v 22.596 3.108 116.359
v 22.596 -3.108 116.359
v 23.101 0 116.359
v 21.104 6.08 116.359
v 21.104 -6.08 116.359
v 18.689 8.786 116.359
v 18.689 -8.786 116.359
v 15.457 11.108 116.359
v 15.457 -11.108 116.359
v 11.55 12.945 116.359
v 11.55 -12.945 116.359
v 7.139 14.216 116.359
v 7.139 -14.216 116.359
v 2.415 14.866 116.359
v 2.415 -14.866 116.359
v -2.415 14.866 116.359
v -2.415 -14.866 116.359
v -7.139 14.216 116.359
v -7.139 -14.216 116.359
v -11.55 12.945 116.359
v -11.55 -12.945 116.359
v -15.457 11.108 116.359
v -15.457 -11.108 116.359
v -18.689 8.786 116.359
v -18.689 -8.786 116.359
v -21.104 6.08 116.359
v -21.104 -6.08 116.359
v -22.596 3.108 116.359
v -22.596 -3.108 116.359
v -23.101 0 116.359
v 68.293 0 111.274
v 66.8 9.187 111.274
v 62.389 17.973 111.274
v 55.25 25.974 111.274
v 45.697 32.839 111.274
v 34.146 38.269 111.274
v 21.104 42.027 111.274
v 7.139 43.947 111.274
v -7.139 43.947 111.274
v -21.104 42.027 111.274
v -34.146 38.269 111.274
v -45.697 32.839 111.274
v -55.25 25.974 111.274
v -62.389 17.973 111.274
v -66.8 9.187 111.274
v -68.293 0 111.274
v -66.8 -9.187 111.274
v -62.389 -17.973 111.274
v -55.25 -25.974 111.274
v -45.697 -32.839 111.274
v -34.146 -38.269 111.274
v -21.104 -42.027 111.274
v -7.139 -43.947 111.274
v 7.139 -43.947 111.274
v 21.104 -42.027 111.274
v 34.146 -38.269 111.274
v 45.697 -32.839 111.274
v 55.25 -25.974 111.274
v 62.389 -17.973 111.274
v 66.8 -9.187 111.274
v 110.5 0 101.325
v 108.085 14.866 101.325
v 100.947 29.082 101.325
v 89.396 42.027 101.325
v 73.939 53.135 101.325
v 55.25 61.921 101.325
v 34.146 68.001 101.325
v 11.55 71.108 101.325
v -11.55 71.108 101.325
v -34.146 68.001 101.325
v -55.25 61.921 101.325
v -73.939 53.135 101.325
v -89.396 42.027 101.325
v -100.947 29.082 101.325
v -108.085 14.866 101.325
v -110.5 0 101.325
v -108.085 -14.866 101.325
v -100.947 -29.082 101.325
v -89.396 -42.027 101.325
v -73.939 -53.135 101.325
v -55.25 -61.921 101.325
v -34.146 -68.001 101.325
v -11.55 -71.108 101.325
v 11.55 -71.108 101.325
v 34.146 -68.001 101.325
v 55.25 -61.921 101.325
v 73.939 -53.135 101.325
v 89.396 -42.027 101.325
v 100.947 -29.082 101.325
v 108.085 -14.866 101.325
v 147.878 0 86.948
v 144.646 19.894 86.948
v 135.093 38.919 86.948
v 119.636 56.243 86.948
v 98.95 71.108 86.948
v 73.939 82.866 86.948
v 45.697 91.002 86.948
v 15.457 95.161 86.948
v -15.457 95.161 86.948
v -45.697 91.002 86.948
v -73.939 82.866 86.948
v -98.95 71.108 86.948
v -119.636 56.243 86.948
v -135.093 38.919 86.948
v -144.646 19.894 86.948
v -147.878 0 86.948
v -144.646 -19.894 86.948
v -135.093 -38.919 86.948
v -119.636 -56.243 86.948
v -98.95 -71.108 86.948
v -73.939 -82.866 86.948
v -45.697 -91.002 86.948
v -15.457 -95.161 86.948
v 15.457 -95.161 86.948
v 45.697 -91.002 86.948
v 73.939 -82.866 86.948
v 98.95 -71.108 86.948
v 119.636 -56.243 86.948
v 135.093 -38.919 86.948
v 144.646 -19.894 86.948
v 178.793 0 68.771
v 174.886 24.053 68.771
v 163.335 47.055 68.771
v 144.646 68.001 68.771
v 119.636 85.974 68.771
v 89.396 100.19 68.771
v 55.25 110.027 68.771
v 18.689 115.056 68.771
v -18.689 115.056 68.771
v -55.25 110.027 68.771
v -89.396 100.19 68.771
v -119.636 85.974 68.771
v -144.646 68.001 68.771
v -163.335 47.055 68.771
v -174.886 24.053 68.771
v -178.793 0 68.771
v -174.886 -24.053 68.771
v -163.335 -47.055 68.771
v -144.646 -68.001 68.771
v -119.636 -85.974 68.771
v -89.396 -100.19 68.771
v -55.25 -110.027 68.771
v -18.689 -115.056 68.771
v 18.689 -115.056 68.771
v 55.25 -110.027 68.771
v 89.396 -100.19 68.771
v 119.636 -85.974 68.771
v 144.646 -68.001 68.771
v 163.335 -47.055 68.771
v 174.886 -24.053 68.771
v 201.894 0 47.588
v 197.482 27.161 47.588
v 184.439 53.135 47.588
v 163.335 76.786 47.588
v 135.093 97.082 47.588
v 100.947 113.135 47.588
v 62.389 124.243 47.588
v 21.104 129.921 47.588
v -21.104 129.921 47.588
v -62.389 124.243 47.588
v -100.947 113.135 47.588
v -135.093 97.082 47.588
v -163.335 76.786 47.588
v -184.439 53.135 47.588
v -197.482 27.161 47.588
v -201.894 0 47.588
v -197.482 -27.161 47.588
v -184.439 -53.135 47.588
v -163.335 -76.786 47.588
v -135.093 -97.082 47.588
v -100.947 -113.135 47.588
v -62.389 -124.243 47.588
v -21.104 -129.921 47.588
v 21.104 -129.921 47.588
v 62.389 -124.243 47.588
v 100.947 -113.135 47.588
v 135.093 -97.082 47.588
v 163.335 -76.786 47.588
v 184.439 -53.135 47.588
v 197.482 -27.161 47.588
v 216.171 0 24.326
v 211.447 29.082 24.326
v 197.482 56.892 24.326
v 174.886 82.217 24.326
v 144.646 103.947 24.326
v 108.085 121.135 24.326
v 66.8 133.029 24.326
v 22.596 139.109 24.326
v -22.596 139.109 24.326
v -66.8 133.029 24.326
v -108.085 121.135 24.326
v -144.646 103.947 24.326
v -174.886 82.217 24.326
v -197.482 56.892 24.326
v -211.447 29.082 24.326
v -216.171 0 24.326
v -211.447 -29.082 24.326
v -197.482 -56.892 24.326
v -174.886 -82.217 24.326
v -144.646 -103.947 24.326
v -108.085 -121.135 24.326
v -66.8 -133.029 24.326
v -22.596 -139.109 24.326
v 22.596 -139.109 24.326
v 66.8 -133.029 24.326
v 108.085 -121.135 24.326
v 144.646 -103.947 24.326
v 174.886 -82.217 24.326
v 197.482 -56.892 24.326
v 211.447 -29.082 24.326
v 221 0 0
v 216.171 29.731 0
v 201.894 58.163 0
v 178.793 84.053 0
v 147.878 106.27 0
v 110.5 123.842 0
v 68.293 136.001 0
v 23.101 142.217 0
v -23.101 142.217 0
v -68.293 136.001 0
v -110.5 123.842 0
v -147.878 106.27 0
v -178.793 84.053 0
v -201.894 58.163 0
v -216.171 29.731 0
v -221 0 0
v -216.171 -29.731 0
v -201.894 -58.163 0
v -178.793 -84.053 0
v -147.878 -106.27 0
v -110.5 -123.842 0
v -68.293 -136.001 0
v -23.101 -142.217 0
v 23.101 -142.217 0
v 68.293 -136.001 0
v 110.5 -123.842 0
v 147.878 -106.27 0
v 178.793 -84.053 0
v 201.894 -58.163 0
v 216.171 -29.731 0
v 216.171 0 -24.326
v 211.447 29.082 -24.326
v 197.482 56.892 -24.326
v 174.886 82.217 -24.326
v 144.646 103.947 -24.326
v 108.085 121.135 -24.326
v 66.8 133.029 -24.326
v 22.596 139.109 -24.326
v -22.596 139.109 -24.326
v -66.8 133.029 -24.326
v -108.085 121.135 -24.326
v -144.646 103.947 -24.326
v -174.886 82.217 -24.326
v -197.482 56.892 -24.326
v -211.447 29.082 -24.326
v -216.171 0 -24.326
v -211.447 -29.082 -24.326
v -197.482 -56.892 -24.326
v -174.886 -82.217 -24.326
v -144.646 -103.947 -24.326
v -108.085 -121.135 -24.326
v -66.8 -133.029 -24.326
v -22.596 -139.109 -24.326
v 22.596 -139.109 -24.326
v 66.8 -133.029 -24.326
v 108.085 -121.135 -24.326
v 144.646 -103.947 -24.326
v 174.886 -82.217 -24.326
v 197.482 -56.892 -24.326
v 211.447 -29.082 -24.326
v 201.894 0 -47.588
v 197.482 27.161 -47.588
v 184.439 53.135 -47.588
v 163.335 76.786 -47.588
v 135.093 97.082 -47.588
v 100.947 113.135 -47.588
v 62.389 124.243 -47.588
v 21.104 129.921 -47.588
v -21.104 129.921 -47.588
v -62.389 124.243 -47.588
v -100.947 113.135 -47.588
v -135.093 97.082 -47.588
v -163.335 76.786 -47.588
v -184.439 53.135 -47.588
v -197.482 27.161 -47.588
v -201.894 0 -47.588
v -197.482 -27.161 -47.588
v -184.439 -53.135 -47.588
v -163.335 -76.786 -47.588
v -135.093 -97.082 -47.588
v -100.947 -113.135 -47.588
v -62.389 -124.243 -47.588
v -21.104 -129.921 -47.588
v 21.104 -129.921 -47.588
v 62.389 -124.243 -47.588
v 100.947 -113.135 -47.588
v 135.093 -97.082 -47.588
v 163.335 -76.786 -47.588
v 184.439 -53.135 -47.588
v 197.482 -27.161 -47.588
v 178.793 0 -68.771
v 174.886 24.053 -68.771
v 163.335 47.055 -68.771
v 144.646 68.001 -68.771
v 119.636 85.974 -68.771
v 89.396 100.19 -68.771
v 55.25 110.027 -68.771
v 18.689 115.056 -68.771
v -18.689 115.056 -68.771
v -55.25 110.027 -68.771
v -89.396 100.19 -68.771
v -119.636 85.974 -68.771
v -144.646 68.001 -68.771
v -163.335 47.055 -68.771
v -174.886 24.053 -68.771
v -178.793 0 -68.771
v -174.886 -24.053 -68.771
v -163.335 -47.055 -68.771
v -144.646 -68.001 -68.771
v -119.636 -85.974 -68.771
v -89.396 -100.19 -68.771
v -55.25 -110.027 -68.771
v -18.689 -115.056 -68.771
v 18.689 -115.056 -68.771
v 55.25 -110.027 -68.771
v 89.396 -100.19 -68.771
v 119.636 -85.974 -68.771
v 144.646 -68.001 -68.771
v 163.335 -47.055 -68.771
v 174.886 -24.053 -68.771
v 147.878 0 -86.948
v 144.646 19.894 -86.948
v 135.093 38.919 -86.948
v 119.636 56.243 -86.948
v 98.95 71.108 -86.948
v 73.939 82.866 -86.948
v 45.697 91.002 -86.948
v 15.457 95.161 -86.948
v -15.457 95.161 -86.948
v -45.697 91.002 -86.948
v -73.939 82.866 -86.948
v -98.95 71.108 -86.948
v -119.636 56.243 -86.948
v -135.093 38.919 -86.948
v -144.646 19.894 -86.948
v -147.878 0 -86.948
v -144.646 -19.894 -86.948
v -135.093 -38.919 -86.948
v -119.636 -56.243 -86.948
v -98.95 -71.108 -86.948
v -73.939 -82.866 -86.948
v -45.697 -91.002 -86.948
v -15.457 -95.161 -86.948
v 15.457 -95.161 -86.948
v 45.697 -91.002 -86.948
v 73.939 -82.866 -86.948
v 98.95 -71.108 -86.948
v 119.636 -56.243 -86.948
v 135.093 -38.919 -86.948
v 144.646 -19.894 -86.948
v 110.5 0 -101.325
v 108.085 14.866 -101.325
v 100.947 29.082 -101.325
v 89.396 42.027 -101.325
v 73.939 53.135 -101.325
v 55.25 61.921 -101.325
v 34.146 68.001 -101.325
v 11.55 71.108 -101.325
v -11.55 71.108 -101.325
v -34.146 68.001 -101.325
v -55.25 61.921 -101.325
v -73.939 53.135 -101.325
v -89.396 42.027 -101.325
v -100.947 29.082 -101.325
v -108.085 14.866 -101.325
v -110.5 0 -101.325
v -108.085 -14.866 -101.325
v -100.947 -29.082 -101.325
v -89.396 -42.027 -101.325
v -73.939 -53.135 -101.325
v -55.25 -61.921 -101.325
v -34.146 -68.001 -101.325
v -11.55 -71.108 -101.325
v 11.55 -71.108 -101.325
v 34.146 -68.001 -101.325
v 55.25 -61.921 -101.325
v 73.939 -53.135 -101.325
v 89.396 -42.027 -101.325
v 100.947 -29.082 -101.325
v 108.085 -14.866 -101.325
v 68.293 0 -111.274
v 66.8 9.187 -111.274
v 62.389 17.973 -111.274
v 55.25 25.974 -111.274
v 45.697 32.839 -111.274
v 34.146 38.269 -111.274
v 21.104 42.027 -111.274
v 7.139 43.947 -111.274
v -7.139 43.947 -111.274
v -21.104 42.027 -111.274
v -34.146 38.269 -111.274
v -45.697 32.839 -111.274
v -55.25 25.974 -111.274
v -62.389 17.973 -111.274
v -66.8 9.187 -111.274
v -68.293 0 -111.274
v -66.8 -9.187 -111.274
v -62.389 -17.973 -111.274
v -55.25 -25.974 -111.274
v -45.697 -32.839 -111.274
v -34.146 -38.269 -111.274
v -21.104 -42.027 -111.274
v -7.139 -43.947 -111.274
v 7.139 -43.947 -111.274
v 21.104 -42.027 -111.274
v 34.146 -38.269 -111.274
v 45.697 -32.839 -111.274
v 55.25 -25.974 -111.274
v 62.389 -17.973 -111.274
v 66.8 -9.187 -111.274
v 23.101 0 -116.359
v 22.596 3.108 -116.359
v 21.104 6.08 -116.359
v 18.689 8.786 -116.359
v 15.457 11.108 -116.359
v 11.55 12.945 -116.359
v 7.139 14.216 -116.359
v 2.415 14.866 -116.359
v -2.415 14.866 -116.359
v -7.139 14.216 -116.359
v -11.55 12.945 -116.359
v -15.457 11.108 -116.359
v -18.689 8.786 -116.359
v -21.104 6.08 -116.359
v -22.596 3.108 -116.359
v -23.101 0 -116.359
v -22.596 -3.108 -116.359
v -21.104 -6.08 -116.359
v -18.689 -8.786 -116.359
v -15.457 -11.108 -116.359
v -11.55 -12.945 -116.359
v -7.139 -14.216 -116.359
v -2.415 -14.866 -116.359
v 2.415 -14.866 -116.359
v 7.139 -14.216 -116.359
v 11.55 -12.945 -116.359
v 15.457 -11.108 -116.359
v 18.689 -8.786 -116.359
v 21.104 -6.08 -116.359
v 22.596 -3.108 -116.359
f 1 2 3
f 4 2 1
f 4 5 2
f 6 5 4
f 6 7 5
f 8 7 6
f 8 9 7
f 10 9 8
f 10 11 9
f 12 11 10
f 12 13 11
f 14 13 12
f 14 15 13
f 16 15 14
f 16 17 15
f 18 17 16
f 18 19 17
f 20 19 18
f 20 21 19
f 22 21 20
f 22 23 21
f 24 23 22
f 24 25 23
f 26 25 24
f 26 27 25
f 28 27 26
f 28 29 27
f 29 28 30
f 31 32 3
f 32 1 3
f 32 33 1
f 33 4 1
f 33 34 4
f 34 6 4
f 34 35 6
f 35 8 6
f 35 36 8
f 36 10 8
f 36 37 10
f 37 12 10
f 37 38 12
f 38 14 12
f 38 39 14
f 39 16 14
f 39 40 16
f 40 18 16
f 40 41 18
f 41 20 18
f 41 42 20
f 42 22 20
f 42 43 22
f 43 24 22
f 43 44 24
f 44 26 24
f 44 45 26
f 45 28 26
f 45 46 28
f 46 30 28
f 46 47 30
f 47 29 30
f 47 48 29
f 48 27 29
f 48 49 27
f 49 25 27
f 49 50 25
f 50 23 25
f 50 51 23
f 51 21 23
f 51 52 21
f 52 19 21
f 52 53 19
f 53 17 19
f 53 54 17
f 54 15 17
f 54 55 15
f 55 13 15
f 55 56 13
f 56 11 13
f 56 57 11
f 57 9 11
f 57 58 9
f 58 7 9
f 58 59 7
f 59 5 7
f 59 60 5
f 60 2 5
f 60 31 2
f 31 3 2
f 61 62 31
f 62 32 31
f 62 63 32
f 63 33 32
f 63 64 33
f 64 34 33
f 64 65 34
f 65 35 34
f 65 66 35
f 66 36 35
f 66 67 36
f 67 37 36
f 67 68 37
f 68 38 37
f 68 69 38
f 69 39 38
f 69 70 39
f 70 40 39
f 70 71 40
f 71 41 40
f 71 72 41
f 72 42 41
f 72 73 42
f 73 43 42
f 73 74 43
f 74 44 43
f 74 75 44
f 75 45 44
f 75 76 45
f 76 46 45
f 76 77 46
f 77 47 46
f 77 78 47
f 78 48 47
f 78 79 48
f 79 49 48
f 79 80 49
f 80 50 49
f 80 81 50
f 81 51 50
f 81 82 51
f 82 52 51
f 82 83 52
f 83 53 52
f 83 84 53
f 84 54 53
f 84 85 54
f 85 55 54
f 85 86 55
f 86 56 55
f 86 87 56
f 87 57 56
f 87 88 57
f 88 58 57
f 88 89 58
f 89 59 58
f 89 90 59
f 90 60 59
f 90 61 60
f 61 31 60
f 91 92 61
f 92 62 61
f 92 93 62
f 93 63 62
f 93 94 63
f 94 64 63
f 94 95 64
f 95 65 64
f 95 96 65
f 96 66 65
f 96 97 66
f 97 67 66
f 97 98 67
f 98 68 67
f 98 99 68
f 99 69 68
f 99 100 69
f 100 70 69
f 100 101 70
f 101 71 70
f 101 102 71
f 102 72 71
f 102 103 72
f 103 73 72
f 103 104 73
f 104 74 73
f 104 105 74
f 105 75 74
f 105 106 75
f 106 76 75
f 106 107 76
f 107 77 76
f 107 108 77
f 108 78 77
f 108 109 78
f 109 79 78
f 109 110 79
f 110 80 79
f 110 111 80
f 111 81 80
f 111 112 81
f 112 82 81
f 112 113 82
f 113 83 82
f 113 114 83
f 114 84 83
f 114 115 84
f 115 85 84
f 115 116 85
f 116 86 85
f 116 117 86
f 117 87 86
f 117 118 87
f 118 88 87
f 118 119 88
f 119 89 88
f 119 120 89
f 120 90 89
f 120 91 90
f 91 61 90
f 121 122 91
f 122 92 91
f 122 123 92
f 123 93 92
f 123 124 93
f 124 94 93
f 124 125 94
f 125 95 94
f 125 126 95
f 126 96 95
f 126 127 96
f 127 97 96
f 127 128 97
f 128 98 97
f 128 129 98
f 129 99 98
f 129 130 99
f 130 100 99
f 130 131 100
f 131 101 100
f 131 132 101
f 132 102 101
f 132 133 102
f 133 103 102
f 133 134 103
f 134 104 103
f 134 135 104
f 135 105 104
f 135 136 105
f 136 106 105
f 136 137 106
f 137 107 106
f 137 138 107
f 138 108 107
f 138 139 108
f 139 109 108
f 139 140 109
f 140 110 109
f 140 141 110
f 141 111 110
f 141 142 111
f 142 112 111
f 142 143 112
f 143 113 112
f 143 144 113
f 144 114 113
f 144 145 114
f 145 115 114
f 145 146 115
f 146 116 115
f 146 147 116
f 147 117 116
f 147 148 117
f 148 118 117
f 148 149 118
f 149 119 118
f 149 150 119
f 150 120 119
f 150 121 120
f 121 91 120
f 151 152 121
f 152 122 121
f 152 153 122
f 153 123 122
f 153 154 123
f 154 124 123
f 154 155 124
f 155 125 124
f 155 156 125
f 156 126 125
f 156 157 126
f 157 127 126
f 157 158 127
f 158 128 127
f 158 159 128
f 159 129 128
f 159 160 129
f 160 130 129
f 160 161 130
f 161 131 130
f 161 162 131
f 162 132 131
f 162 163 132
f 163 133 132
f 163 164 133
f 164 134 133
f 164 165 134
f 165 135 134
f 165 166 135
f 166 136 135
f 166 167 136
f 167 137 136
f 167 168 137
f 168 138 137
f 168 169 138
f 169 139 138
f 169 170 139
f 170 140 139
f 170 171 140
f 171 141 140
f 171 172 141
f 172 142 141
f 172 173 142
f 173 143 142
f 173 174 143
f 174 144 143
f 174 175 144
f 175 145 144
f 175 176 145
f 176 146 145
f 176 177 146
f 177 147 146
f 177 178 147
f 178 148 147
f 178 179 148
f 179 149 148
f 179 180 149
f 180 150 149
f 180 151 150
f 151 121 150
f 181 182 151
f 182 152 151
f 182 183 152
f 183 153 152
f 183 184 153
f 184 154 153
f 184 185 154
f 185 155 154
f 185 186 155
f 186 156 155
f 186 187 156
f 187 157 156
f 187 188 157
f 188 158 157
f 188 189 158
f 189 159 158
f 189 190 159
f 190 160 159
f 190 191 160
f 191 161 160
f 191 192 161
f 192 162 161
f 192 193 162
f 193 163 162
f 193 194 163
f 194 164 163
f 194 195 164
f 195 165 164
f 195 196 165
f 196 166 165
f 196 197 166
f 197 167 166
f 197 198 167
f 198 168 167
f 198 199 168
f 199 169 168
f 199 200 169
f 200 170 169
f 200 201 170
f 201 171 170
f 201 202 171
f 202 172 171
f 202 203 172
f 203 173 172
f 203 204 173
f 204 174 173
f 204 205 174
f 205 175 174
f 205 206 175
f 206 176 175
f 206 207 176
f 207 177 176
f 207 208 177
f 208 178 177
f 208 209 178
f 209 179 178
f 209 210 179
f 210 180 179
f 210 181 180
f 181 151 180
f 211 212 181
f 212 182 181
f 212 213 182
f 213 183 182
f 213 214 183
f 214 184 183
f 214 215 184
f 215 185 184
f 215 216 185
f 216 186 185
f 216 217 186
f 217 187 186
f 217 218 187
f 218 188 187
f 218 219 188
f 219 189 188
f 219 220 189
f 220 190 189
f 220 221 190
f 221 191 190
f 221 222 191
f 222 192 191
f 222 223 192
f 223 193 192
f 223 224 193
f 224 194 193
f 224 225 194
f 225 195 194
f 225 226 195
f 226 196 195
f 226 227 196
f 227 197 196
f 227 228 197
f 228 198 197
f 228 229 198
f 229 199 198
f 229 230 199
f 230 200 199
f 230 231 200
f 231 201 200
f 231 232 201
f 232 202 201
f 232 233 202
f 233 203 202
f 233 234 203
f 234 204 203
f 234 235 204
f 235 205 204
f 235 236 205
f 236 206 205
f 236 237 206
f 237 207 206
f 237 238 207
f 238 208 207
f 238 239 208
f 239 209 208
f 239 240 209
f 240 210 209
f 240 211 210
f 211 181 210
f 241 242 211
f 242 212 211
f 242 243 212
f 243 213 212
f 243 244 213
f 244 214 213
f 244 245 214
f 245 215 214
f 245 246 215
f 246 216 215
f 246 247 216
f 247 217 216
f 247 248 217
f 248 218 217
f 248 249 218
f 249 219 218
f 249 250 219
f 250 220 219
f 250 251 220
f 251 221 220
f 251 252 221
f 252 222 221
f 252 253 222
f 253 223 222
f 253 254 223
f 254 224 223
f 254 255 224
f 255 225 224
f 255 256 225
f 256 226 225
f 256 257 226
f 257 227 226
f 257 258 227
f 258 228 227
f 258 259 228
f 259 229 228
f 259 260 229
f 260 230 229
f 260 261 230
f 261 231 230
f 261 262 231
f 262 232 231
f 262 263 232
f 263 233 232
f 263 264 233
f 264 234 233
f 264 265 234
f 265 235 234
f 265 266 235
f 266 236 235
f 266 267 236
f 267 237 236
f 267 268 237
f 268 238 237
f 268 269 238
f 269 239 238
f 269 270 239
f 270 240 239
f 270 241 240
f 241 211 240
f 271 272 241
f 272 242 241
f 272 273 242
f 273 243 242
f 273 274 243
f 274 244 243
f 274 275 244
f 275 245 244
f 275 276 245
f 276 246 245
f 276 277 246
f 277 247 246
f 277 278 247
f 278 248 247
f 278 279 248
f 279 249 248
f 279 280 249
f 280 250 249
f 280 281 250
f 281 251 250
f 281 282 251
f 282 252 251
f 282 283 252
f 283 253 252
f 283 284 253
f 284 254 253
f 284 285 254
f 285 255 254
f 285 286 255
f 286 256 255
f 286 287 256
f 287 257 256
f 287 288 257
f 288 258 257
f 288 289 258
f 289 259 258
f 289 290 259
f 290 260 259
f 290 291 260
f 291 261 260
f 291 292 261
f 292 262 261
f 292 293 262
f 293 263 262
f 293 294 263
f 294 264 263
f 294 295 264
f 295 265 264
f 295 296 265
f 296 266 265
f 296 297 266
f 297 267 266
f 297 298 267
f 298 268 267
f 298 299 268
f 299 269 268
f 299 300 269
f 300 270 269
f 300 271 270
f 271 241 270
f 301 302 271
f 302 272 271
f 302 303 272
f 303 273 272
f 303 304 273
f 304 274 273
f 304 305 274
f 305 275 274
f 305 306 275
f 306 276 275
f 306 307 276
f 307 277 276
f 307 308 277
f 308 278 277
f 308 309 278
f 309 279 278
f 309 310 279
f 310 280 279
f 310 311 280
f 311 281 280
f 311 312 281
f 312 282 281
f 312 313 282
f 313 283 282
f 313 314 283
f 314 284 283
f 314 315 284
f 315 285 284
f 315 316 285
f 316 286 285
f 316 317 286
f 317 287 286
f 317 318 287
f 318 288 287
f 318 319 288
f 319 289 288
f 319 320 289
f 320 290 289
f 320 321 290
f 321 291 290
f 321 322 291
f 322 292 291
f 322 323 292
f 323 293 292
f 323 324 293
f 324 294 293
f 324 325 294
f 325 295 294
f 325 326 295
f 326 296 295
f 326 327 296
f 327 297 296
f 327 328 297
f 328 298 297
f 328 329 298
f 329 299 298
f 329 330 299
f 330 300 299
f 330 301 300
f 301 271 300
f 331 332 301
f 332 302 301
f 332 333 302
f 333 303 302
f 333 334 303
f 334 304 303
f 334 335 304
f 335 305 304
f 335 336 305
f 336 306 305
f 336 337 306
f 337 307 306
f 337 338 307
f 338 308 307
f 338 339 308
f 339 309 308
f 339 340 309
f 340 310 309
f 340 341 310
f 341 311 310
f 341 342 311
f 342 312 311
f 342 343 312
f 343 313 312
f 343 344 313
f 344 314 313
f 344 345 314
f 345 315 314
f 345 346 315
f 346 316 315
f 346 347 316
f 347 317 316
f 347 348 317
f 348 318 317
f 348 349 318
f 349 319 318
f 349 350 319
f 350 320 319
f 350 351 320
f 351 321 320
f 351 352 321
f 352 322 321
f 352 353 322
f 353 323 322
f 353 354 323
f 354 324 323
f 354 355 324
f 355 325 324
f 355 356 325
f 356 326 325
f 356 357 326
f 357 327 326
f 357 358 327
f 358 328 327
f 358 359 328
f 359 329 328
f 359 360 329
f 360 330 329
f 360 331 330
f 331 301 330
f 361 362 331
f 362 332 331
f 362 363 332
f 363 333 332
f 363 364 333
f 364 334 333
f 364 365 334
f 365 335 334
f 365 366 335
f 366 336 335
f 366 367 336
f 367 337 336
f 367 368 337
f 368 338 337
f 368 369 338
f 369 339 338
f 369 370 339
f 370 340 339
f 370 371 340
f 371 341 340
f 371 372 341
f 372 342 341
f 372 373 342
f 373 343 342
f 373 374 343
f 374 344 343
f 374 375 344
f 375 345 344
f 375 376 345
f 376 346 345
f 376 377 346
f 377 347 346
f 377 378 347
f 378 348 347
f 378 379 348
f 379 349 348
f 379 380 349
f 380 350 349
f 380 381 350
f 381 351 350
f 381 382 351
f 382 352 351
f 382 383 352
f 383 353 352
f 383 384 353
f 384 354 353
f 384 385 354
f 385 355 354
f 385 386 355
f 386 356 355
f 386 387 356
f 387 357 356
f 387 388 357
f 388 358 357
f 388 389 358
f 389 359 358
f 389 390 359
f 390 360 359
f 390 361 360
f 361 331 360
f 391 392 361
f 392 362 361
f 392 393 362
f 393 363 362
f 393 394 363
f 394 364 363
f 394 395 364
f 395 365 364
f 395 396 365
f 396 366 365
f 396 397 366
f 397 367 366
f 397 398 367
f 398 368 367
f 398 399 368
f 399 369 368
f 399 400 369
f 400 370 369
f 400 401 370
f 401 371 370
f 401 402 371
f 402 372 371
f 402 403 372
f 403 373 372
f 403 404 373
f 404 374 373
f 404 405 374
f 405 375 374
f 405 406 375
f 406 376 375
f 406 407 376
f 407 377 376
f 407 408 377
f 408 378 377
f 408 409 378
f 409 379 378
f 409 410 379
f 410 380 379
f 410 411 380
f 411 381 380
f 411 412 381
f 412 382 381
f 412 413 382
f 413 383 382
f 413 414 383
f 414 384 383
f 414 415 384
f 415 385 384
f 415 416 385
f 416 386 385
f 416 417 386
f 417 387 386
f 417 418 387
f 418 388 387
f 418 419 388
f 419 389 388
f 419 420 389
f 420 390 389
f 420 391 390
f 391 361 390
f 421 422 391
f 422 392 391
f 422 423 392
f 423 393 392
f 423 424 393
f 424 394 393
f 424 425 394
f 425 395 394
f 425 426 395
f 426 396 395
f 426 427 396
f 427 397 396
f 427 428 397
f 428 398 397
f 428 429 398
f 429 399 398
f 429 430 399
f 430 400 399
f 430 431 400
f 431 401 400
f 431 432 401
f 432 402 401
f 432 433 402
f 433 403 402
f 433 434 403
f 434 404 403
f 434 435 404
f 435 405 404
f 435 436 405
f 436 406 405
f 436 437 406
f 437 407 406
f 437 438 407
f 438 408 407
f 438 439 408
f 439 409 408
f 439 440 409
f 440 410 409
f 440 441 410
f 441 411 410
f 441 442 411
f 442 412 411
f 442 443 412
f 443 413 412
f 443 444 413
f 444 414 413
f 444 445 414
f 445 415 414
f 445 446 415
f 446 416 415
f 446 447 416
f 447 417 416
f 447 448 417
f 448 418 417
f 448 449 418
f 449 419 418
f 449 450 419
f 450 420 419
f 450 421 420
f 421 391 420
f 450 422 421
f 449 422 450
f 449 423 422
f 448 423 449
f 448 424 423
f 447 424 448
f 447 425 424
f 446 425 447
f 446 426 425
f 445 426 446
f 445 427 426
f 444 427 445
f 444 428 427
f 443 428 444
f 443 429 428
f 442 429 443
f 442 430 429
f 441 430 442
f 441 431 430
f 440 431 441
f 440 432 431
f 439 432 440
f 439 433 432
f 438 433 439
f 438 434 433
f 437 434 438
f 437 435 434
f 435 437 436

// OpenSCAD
// Generated by SolidPython 1.0.1 on 2020-07-29 00:46:53


scale(v = [17, 11, 9]) {
	sphere(r = 13);
}
/***********************************************
*********      SolidPython code:      **********
************************************************
 
# import packages: SolidPython
from solid import *
from solid.utils import *
from itertools import chain, combinations, permutations


class Resize:

    def __init__(self, scad_file):
        self.scad_file = scad_file
        #self.scad_file = import_scad(scad_file)
        # cone/cylinder param:
        self.r1 = 0
        self.r2 = 0
        self.h = 0
        # rectangular prism param:
        self.w = 0
        self.l = 0
        # ellipse param:
        self.r = 0

    # import OpenScad code (file name corresponds to shape)


    # classify shape + parameters
    def assign(self, param1, param2, param3):
        if self.scad_file == 'cone.scad':
            self.r1 = param1
            self.r2 = param2
            self.h = param3
        elif self.scad_file == 'cylinder.scad':
            self.r1 = param1
            self.r2 = param2
            self.h = param3
        elif self.scad_file == 'rectangularPrism.scad':
            self.h = param1
            self.l = param2
            self.w = param3
        else:
            self.r = param1
            self.h = param2

    # resize parameters
    def iterate(self):
        x = range(3, 20, 2)
        i = 1
        if self.scad_file == 'cone.scad':
            tempList = list(permutations(x, 2))
            for temp in tempList:
                param1 = temp[0]
                param2 = temp[1]
                filepath = 'produced_scad_files/' + 'cone' + str(param1) + '_' + str(param2) + '_' + '.scad'
                scad_render_to_file(cylinder(h=param1, r1=param2, r2=0), filepath)

        elif self.scad_file == 'cylinder.scad':
            tempList = list(permutations(x, 3))
            for temp in tempList:
                param1 = temp[0]
                param2 = temp[1]
                filepath = 'produced_scad_files/' + 'cylinder' + str(param1) + '_' + str(param2) + '_' + '.scad'
                scad_render_to_file(cylinder(h=param1, r1=param2, r2=param2), filepath)

        elif self.scad_file == 'rectangularPrism.scad':
            tempList = list(permutations(x, 3))
            for temp in tempList:
                param1 = temp[0]
                param2 = temp[1]
                param3 = temp[2]
                filepath = 'produced_scad_files/' + 'rectangularPrism' + str(param1) + '_' + str(param2) + '_' + str(
                    param3) + '.scad'
                scad_render_to_file(cube(size=(param1, param2, param3)), filepath)

        elif self.scad_file == 'ellipse.scad':
            tempList = list(permutations(x, 4))
            for temp in tempList:
                param1 = temp[0]
                param2 = temp[1]
                param3 = temp[2]
                param4 = temp[3]
                filepath = 'produced_scad_files/' + 'ellipse' + str(param1) + '_' + str(param2) + '_' + str(param3) + '_' + str(param4) + '.scad'
                scad_render_to_file(scale([param1, param2, param3])(sphere(r=param4)), filepath)

    def render_to_scadfile(self):
        scad_render_to_file(scad, 'example.scad') 
 
************************************************/
